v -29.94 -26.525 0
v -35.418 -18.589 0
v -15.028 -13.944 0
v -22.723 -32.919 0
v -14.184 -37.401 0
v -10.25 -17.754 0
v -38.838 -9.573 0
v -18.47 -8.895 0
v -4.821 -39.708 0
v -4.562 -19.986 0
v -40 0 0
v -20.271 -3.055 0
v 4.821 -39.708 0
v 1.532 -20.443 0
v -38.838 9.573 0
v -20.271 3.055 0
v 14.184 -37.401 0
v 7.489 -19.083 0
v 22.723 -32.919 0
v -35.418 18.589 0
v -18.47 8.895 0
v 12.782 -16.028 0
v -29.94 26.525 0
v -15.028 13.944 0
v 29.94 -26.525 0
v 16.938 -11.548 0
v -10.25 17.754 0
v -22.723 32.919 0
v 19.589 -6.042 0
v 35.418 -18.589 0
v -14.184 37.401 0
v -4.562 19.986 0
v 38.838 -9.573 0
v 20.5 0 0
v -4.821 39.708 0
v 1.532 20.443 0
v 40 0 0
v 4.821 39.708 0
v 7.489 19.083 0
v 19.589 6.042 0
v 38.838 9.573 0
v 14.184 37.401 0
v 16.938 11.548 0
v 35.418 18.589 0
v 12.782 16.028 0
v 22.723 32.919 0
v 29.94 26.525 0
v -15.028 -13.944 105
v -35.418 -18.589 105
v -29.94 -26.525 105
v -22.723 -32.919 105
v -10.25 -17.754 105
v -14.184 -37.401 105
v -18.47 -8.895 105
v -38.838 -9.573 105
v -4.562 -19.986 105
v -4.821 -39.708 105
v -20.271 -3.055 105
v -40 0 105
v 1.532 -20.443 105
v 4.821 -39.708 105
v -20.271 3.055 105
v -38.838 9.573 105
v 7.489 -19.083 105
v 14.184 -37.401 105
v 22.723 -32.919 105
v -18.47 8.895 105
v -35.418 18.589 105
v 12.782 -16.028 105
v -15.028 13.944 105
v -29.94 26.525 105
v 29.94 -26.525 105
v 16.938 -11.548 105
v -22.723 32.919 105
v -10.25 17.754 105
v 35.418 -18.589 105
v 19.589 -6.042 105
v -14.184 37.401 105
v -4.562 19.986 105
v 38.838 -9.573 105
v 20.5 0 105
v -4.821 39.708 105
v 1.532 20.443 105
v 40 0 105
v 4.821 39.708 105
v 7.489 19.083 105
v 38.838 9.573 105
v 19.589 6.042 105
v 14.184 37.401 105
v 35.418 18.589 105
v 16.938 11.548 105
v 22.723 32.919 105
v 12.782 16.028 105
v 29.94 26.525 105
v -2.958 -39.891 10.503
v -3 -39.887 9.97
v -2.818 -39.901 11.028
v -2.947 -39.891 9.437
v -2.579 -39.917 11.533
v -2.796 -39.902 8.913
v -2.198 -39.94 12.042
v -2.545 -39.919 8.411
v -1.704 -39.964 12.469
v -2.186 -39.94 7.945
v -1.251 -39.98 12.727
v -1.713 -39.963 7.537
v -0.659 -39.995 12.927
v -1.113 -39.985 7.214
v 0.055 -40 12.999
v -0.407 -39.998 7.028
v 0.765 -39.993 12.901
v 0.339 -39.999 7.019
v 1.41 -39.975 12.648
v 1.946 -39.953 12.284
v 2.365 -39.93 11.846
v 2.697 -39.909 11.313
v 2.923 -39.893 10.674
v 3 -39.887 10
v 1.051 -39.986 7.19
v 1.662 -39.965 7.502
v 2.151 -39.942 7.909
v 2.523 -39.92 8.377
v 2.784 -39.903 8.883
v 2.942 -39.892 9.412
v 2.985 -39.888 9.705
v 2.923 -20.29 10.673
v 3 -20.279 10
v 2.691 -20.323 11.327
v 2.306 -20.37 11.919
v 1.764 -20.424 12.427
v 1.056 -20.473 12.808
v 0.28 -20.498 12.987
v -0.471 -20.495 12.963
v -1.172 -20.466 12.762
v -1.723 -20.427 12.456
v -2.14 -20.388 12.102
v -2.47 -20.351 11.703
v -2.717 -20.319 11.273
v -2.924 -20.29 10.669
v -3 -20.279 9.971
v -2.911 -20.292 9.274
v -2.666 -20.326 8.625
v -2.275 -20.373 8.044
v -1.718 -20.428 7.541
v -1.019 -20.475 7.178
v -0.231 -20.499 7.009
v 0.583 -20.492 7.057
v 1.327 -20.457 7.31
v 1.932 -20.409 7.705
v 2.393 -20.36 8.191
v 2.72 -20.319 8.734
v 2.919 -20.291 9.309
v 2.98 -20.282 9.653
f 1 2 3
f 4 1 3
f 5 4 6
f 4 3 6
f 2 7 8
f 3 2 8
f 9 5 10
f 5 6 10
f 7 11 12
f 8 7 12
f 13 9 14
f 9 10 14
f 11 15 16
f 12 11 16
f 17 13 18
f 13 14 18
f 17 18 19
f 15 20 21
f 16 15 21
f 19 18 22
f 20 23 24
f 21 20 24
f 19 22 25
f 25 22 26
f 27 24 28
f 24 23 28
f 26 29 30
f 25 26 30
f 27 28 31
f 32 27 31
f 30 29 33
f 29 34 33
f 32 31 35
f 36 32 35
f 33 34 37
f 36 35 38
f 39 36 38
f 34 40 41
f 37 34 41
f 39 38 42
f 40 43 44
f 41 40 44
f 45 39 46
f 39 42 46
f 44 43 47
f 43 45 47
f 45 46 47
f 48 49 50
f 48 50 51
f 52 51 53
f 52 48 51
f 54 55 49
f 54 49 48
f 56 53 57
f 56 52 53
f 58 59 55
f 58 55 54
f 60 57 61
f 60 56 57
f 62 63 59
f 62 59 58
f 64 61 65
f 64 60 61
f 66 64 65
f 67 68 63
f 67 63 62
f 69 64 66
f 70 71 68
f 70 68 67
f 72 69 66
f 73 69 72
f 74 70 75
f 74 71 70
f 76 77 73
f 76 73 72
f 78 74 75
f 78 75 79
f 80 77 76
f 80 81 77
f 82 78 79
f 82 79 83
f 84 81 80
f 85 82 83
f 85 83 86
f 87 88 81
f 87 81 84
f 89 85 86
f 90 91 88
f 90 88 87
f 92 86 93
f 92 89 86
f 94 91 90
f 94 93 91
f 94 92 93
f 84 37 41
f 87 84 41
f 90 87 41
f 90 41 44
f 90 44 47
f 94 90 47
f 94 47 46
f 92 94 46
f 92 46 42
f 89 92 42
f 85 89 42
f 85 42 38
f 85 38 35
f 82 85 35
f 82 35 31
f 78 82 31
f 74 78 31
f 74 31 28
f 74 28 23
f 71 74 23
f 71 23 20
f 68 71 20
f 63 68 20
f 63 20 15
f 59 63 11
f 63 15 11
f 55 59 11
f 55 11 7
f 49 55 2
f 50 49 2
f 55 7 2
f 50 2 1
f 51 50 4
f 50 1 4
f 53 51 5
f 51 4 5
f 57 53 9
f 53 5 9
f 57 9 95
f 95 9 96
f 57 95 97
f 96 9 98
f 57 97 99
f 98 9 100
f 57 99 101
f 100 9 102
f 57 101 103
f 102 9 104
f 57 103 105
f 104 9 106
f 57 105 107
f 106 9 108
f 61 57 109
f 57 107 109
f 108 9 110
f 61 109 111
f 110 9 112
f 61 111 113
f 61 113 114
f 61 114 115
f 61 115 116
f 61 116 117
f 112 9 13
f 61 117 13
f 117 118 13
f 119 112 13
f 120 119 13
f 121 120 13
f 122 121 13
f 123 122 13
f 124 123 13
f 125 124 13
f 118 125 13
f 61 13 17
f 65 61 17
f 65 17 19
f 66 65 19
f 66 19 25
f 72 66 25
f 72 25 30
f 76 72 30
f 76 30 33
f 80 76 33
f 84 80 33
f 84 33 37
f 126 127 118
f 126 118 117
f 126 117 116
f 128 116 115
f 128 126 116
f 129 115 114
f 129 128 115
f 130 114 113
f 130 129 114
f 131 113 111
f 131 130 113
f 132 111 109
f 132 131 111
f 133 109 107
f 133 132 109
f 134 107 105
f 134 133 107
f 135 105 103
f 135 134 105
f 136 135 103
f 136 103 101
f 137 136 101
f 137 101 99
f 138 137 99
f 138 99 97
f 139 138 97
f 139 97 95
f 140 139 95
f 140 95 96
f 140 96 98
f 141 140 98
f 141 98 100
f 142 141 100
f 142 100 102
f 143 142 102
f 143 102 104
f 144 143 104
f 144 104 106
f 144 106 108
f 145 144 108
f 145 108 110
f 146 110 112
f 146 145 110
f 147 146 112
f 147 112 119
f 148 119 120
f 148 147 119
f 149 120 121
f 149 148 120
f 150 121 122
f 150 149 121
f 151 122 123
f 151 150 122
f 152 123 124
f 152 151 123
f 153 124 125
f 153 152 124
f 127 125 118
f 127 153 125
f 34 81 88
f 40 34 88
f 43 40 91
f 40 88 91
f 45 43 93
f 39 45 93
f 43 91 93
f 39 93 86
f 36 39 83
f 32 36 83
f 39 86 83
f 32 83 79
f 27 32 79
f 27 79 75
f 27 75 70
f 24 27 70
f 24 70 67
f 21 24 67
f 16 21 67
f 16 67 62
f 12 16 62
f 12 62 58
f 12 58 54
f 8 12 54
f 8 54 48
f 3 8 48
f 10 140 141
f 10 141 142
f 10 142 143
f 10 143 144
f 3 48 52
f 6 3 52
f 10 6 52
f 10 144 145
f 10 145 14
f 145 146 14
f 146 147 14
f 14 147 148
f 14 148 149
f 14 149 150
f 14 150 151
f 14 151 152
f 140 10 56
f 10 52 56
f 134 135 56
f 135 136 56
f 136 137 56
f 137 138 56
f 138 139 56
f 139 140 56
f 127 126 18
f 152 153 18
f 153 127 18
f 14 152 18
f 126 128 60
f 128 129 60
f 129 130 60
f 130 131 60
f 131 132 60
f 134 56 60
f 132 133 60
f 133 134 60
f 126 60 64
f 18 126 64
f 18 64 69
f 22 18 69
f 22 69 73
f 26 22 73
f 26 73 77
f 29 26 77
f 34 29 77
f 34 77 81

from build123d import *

# Parameters (mm, degrees)
F0_R     = 40
F1_DEPTH = 105
F2_R     = 20.5
F3_DEPTH = 105.001
F4_R     = 3
F5_DEPTH = 40.001


with BuildPart() as f1:
    # F0 (on Top) → F1 (new body)
    with BuildSketch(Plane.XY):
        Circle(F0_R)
    extrude(amount=F1_DEPTH)

    # F2 (on face) → F3 (cut, through all)
    with BuildSketch(Plane.XY.offset(105)):
        Circle(F2_R)
    extrude(amount=-F3_DEPTH, mode=Mode.SUBTRACT)

    # F4 (on Front) → F5 (cut, through all)
    with BuildSketch(Plane.XZ):
        with Locations((0, 10)):
            Circle(F4_R)
    extrude(amount=F5_DEPTH, mode=Mode.SUBTRACT)


solid = f1.part
